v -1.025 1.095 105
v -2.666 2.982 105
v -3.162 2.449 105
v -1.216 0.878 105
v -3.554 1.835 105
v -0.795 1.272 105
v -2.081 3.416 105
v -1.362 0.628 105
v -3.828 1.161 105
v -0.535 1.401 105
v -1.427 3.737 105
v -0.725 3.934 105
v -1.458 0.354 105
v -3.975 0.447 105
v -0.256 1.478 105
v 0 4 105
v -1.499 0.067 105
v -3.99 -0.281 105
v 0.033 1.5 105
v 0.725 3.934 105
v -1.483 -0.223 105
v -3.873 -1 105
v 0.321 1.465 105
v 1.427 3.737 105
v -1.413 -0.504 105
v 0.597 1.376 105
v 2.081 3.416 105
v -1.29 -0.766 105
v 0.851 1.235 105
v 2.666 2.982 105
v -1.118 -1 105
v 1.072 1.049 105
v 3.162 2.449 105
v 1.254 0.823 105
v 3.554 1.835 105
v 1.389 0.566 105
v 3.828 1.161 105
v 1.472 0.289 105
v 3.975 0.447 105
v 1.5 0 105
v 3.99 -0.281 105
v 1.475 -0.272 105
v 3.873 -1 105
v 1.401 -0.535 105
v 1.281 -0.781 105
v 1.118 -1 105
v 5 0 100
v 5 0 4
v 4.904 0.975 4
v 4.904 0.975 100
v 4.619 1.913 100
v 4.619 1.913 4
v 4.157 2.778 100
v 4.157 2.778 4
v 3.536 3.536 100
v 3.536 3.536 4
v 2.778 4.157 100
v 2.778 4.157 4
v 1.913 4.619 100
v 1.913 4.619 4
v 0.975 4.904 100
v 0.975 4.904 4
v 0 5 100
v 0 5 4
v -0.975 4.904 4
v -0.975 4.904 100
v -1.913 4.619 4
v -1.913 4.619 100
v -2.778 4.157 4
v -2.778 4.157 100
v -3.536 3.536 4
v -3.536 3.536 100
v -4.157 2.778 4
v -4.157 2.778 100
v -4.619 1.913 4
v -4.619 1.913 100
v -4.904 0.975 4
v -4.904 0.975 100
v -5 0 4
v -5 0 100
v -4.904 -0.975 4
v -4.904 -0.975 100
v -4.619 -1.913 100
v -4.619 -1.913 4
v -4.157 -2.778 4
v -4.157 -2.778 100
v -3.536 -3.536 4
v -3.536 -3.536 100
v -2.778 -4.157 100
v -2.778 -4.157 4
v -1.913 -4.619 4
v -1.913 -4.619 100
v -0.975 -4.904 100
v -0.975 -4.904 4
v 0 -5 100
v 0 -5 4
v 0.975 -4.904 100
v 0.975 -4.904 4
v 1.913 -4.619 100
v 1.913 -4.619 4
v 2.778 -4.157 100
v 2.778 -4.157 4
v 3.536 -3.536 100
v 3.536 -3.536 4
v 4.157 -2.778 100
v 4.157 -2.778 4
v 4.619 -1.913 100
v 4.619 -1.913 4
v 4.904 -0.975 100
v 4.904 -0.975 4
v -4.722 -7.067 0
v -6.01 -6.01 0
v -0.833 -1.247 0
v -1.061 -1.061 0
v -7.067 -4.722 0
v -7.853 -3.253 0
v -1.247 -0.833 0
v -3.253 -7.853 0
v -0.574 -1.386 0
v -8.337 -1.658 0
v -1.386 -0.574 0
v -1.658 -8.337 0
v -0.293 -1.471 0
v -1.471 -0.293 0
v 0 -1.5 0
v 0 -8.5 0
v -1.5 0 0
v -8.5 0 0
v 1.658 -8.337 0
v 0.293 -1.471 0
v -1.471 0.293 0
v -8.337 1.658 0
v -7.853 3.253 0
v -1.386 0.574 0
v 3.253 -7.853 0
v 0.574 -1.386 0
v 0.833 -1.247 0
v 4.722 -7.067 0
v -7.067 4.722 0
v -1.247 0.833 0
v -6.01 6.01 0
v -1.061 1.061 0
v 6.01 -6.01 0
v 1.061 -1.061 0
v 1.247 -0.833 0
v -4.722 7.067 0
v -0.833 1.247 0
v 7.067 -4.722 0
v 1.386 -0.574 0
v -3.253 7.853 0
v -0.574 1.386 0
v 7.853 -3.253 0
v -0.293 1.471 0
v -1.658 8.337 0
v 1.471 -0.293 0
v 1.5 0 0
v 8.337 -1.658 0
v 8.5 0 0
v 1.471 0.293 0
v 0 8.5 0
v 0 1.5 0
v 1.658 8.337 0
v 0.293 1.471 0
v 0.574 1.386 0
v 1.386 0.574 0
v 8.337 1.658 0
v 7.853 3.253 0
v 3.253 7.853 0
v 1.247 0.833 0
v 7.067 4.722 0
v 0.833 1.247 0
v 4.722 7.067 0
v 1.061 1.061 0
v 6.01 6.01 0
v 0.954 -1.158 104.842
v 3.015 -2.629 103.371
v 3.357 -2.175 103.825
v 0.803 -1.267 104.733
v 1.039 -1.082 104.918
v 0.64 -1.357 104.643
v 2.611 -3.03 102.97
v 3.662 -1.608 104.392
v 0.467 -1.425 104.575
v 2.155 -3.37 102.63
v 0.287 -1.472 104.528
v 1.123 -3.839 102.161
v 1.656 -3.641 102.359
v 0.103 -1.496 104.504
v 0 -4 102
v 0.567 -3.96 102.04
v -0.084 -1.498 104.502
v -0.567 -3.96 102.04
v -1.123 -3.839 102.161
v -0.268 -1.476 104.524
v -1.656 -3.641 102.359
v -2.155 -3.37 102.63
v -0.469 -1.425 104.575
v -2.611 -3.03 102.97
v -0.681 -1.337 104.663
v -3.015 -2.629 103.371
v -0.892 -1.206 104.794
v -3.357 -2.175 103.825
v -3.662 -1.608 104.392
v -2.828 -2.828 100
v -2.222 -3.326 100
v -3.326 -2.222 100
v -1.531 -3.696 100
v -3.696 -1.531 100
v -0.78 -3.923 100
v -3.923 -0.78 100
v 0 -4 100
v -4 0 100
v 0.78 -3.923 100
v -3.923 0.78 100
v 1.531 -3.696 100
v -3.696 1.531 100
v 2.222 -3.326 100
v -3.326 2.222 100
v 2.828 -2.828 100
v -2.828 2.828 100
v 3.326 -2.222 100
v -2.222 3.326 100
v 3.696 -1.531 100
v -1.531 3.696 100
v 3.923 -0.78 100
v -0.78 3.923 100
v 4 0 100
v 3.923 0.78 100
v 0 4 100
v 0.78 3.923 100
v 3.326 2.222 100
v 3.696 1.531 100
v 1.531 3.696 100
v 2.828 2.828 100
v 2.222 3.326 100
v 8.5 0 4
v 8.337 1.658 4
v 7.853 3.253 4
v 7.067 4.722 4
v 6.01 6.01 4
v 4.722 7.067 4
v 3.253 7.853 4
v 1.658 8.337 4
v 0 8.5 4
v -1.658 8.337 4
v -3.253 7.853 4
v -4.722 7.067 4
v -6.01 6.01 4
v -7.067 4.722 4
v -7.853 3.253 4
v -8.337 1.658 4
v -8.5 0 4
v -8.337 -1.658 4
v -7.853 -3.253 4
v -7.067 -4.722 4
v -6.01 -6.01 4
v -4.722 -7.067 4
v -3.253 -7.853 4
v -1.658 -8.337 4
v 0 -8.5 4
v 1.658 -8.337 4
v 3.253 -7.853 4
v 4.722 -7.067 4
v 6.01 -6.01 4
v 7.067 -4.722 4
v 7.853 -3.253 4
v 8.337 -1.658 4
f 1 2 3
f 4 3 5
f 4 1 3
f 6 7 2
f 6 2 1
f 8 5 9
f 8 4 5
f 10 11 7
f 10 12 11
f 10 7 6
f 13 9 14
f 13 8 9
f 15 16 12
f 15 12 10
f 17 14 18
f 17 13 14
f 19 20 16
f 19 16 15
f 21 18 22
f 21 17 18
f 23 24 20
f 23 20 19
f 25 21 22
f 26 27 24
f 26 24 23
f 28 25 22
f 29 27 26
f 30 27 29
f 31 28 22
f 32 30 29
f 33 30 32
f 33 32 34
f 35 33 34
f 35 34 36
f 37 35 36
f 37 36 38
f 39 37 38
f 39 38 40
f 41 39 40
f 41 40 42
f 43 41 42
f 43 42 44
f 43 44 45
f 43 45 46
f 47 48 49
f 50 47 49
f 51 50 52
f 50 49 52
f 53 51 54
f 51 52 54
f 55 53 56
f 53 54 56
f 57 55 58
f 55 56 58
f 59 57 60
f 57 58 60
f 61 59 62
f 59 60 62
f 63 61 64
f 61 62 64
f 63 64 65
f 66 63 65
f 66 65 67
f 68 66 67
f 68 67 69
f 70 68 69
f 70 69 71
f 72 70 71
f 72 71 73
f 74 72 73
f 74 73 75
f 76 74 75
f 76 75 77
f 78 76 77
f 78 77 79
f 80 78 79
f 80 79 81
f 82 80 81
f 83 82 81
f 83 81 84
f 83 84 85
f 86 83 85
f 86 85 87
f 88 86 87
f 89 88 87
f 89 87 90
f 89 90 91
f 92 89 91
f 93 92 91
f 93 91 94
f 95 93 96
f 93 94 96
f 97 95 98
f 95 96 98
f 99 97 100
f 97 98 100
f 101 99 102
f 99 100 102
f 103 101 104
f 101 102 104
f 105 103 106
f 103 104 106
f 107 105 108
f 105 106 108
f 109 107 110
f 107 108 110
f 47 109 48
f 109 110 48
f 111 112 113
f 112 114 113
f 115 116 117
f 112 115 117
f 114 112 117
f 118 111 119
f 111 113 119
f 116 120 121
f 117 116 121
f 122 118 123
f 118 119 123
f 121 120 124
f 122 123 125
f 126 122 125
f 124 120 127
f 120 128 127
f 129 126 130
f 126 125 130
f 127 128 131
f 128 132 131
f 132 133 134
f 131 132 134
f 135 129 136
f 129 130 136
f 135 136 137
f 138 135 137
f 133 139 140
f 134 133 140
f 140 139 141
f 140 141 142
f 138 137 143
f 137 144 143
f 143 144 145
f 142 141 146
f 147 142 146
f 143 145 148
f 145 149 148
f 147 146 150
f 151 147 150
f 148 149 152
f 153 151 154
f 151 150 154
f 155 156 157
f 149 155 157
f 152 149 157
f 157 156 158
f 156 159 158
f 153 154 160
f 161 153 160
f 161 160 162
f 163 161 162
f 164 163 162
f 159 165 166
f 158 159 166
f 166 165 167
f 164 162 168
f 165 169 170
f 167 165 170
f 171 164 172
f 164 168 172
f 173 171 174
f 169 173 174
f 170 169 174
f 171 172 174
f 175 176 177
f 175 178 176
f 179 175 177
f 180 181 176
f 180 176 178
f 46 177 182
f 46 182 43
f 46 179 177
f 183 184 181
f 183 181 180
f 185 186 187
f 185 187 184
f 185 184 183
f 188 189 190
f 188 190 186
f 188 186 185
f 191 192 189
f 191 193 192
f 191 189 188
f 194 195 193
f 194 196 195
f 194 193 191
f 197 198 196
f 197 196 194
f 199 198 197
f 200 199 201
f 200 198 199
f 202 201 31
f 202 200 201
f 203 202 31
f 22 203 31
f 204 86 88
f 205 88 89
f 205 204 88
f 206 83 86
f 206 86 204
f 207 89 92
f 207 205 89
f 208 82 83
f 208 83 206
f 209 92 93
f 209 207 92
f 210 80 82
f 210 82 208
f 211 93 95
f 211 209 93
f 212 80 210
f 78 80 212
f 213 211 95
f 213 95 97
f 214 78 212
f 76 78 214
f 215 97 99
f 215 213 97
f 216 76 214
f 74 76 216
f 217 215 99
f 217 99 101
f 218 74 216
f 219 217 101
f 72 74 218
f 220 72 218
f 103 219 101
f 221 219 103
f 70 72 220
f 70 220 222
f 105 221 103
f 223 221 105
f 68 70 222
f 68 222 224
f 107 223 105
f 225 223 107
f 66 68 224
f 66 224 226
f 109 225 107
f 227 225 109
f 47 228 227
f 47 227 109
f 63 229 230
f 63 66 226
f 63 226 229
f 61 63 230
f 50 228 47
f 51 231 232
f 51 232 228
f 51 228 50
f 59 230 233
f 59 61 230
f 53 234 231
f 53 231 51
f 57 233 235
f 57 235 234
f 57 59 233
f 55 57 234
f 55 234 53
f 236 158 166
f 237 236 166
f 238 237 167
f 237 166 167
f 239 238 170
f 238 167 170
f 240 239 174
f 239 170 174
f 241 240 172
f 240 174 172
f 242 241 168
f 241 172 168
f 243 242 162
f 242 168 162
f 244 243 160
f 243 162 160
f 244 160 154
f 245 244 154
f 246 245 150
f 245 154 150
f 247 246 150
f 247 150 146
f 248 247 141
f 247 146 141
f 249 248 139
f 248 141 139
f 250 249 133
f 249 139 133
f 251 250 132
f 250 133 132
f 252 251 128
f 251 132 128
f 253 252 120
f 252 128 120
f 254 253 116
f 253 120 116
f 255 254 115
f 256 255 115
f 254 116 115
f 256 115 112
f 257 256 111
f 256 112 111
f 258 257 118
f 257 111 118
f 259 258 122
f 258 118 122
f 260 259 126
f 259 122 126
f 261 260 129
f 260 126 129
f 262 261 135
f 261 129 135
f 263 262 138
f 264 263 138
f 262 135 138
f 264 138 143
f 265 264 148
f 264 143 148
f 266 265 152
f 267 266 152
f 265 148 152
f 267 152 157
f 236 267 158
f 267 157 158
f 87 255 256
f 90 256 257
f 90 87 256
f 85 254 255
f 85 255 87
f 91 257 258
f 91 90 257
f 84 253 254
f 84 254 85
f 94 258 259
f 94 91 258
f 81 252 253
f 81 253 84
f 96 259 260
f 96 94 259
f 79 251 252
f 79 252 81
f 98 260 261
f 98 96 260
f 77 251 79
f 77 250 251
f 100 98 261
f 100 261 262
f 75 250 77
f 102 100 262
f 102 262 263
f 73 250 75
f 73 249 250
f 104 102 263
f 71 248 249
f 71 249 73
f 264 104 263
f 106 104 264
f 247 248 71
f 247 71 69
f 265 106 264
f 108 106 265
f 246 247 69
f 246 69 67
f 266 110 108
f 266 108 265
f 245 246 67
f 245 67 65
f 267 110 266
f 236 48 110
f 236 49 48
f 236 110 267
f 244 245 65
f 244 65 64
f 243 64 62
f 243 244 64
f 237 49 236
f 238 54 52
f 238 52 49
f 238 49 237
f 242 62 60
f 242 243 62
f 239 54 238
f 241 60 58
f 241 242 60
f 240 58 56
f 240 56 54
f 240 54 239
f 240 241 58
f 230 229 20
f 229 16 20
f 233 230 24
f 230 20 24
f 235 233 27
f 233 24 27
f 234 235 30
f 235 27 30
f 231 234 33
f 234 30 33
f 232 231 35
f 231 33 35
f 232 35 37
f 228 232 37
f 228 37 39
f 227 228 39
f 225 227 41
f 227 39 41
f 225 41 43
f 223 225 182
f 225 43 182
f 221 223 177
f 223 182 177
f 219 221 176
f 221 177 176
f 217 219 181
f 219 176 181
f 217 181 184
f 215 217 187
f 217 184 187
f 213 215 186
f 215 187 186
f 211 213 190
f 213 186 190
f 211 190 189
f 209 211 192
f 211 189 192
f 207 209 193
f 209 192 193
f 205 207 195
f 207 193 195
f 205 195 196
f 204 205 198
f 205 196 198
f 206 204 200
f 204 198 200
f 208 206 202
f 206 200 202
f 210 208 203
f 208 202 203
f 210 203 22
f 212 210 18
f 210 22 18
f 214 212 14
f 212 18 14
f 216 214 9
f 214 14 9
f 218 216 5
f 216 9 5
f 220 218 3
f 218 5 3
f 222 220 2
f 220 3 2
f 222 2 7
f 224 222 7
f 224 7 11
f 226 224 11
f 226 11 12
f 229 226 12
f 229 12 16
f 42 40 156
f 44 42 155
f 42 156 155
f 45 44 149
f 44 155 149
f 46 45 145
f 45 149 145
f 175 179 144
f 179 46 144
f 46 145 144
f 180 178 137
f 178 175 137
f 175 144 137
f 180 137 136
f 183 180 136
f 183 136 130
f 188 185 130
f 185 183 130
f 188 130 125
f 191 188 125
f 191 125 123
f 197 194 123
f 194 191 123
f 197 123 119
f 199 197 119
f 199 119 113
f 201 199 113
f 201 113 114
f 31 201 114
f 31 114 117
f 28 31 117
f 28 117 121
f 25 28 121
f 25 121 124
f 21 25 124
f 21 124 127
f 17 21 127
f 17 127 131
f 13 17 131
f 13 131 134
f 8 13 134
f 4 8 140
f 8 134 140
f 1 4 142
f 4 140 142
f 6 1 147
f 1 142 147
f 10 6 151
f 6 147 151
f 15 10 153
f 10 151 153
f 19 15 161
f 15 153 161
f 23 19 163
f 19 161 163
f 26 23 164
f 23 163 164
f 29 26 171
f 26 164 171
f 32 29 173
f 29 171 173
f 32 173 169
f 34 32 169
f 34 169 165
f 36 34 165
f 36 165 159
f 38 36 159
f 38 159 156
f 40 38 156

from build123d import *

# Parameters (mm, degrees)
F0_R          = 8.5
F1_DEPTH      = 4
F3_R          = 5
F4_DEPTH      = 100
F5_W          = 4
F5_H          = 5
F9_DEPTH      = 8.501
F9_DEPTH_BACK = 25
F10_R         = 1.5
F11_DEPTH     = 110.8


with BuildPart() as f1:
    # F0 (on Top) → F1 (new body)
    with BuildSketch(Plane.XY):
        Circle(F0_R)
    extrude(amount=F1_DEPTH)

    # F3 (on Top) → F4 (join)
    with BuildSketch(Plane.XY):
        Circle(F3_R)
    extrude(amount=F4_DEPTH)

    # F5 (on Right) → F6 (revolve)
    with BuildSketch(Plane.YZ):
        with Locations((2, 102.5)):
            Rectangle(F5_W, F5_H)
    revolve(axis=Axis((0, 0, 102.5), (0, 0, -1)))

    # F8 (on Right) → F9 (cut, two sides)
    with BuildSketch(Plane.YZ) as f9_sk:
        Polygon((0, 106), (-5, 106), (-5, 101), align=None)
    extrude(amount=-F9_DEPTH, mode=Mode.SUBTRACT)
    extrude(f9_sk.sketch, amount=F9_DEPTH_BACK, mode=Mode.SUBTRACT)

    # F10 (on face) → F11 (cut)
    with BuildSketch(Plane(origin=(0, 0, 0), x_dir=(1, 0, 0), z_dir=(0, 0, -1))):
        Circle(F10_R)
    extrude(amount=-F11_DEPTH, mode=Mode.SUBTRACT)


solid = f1.part
